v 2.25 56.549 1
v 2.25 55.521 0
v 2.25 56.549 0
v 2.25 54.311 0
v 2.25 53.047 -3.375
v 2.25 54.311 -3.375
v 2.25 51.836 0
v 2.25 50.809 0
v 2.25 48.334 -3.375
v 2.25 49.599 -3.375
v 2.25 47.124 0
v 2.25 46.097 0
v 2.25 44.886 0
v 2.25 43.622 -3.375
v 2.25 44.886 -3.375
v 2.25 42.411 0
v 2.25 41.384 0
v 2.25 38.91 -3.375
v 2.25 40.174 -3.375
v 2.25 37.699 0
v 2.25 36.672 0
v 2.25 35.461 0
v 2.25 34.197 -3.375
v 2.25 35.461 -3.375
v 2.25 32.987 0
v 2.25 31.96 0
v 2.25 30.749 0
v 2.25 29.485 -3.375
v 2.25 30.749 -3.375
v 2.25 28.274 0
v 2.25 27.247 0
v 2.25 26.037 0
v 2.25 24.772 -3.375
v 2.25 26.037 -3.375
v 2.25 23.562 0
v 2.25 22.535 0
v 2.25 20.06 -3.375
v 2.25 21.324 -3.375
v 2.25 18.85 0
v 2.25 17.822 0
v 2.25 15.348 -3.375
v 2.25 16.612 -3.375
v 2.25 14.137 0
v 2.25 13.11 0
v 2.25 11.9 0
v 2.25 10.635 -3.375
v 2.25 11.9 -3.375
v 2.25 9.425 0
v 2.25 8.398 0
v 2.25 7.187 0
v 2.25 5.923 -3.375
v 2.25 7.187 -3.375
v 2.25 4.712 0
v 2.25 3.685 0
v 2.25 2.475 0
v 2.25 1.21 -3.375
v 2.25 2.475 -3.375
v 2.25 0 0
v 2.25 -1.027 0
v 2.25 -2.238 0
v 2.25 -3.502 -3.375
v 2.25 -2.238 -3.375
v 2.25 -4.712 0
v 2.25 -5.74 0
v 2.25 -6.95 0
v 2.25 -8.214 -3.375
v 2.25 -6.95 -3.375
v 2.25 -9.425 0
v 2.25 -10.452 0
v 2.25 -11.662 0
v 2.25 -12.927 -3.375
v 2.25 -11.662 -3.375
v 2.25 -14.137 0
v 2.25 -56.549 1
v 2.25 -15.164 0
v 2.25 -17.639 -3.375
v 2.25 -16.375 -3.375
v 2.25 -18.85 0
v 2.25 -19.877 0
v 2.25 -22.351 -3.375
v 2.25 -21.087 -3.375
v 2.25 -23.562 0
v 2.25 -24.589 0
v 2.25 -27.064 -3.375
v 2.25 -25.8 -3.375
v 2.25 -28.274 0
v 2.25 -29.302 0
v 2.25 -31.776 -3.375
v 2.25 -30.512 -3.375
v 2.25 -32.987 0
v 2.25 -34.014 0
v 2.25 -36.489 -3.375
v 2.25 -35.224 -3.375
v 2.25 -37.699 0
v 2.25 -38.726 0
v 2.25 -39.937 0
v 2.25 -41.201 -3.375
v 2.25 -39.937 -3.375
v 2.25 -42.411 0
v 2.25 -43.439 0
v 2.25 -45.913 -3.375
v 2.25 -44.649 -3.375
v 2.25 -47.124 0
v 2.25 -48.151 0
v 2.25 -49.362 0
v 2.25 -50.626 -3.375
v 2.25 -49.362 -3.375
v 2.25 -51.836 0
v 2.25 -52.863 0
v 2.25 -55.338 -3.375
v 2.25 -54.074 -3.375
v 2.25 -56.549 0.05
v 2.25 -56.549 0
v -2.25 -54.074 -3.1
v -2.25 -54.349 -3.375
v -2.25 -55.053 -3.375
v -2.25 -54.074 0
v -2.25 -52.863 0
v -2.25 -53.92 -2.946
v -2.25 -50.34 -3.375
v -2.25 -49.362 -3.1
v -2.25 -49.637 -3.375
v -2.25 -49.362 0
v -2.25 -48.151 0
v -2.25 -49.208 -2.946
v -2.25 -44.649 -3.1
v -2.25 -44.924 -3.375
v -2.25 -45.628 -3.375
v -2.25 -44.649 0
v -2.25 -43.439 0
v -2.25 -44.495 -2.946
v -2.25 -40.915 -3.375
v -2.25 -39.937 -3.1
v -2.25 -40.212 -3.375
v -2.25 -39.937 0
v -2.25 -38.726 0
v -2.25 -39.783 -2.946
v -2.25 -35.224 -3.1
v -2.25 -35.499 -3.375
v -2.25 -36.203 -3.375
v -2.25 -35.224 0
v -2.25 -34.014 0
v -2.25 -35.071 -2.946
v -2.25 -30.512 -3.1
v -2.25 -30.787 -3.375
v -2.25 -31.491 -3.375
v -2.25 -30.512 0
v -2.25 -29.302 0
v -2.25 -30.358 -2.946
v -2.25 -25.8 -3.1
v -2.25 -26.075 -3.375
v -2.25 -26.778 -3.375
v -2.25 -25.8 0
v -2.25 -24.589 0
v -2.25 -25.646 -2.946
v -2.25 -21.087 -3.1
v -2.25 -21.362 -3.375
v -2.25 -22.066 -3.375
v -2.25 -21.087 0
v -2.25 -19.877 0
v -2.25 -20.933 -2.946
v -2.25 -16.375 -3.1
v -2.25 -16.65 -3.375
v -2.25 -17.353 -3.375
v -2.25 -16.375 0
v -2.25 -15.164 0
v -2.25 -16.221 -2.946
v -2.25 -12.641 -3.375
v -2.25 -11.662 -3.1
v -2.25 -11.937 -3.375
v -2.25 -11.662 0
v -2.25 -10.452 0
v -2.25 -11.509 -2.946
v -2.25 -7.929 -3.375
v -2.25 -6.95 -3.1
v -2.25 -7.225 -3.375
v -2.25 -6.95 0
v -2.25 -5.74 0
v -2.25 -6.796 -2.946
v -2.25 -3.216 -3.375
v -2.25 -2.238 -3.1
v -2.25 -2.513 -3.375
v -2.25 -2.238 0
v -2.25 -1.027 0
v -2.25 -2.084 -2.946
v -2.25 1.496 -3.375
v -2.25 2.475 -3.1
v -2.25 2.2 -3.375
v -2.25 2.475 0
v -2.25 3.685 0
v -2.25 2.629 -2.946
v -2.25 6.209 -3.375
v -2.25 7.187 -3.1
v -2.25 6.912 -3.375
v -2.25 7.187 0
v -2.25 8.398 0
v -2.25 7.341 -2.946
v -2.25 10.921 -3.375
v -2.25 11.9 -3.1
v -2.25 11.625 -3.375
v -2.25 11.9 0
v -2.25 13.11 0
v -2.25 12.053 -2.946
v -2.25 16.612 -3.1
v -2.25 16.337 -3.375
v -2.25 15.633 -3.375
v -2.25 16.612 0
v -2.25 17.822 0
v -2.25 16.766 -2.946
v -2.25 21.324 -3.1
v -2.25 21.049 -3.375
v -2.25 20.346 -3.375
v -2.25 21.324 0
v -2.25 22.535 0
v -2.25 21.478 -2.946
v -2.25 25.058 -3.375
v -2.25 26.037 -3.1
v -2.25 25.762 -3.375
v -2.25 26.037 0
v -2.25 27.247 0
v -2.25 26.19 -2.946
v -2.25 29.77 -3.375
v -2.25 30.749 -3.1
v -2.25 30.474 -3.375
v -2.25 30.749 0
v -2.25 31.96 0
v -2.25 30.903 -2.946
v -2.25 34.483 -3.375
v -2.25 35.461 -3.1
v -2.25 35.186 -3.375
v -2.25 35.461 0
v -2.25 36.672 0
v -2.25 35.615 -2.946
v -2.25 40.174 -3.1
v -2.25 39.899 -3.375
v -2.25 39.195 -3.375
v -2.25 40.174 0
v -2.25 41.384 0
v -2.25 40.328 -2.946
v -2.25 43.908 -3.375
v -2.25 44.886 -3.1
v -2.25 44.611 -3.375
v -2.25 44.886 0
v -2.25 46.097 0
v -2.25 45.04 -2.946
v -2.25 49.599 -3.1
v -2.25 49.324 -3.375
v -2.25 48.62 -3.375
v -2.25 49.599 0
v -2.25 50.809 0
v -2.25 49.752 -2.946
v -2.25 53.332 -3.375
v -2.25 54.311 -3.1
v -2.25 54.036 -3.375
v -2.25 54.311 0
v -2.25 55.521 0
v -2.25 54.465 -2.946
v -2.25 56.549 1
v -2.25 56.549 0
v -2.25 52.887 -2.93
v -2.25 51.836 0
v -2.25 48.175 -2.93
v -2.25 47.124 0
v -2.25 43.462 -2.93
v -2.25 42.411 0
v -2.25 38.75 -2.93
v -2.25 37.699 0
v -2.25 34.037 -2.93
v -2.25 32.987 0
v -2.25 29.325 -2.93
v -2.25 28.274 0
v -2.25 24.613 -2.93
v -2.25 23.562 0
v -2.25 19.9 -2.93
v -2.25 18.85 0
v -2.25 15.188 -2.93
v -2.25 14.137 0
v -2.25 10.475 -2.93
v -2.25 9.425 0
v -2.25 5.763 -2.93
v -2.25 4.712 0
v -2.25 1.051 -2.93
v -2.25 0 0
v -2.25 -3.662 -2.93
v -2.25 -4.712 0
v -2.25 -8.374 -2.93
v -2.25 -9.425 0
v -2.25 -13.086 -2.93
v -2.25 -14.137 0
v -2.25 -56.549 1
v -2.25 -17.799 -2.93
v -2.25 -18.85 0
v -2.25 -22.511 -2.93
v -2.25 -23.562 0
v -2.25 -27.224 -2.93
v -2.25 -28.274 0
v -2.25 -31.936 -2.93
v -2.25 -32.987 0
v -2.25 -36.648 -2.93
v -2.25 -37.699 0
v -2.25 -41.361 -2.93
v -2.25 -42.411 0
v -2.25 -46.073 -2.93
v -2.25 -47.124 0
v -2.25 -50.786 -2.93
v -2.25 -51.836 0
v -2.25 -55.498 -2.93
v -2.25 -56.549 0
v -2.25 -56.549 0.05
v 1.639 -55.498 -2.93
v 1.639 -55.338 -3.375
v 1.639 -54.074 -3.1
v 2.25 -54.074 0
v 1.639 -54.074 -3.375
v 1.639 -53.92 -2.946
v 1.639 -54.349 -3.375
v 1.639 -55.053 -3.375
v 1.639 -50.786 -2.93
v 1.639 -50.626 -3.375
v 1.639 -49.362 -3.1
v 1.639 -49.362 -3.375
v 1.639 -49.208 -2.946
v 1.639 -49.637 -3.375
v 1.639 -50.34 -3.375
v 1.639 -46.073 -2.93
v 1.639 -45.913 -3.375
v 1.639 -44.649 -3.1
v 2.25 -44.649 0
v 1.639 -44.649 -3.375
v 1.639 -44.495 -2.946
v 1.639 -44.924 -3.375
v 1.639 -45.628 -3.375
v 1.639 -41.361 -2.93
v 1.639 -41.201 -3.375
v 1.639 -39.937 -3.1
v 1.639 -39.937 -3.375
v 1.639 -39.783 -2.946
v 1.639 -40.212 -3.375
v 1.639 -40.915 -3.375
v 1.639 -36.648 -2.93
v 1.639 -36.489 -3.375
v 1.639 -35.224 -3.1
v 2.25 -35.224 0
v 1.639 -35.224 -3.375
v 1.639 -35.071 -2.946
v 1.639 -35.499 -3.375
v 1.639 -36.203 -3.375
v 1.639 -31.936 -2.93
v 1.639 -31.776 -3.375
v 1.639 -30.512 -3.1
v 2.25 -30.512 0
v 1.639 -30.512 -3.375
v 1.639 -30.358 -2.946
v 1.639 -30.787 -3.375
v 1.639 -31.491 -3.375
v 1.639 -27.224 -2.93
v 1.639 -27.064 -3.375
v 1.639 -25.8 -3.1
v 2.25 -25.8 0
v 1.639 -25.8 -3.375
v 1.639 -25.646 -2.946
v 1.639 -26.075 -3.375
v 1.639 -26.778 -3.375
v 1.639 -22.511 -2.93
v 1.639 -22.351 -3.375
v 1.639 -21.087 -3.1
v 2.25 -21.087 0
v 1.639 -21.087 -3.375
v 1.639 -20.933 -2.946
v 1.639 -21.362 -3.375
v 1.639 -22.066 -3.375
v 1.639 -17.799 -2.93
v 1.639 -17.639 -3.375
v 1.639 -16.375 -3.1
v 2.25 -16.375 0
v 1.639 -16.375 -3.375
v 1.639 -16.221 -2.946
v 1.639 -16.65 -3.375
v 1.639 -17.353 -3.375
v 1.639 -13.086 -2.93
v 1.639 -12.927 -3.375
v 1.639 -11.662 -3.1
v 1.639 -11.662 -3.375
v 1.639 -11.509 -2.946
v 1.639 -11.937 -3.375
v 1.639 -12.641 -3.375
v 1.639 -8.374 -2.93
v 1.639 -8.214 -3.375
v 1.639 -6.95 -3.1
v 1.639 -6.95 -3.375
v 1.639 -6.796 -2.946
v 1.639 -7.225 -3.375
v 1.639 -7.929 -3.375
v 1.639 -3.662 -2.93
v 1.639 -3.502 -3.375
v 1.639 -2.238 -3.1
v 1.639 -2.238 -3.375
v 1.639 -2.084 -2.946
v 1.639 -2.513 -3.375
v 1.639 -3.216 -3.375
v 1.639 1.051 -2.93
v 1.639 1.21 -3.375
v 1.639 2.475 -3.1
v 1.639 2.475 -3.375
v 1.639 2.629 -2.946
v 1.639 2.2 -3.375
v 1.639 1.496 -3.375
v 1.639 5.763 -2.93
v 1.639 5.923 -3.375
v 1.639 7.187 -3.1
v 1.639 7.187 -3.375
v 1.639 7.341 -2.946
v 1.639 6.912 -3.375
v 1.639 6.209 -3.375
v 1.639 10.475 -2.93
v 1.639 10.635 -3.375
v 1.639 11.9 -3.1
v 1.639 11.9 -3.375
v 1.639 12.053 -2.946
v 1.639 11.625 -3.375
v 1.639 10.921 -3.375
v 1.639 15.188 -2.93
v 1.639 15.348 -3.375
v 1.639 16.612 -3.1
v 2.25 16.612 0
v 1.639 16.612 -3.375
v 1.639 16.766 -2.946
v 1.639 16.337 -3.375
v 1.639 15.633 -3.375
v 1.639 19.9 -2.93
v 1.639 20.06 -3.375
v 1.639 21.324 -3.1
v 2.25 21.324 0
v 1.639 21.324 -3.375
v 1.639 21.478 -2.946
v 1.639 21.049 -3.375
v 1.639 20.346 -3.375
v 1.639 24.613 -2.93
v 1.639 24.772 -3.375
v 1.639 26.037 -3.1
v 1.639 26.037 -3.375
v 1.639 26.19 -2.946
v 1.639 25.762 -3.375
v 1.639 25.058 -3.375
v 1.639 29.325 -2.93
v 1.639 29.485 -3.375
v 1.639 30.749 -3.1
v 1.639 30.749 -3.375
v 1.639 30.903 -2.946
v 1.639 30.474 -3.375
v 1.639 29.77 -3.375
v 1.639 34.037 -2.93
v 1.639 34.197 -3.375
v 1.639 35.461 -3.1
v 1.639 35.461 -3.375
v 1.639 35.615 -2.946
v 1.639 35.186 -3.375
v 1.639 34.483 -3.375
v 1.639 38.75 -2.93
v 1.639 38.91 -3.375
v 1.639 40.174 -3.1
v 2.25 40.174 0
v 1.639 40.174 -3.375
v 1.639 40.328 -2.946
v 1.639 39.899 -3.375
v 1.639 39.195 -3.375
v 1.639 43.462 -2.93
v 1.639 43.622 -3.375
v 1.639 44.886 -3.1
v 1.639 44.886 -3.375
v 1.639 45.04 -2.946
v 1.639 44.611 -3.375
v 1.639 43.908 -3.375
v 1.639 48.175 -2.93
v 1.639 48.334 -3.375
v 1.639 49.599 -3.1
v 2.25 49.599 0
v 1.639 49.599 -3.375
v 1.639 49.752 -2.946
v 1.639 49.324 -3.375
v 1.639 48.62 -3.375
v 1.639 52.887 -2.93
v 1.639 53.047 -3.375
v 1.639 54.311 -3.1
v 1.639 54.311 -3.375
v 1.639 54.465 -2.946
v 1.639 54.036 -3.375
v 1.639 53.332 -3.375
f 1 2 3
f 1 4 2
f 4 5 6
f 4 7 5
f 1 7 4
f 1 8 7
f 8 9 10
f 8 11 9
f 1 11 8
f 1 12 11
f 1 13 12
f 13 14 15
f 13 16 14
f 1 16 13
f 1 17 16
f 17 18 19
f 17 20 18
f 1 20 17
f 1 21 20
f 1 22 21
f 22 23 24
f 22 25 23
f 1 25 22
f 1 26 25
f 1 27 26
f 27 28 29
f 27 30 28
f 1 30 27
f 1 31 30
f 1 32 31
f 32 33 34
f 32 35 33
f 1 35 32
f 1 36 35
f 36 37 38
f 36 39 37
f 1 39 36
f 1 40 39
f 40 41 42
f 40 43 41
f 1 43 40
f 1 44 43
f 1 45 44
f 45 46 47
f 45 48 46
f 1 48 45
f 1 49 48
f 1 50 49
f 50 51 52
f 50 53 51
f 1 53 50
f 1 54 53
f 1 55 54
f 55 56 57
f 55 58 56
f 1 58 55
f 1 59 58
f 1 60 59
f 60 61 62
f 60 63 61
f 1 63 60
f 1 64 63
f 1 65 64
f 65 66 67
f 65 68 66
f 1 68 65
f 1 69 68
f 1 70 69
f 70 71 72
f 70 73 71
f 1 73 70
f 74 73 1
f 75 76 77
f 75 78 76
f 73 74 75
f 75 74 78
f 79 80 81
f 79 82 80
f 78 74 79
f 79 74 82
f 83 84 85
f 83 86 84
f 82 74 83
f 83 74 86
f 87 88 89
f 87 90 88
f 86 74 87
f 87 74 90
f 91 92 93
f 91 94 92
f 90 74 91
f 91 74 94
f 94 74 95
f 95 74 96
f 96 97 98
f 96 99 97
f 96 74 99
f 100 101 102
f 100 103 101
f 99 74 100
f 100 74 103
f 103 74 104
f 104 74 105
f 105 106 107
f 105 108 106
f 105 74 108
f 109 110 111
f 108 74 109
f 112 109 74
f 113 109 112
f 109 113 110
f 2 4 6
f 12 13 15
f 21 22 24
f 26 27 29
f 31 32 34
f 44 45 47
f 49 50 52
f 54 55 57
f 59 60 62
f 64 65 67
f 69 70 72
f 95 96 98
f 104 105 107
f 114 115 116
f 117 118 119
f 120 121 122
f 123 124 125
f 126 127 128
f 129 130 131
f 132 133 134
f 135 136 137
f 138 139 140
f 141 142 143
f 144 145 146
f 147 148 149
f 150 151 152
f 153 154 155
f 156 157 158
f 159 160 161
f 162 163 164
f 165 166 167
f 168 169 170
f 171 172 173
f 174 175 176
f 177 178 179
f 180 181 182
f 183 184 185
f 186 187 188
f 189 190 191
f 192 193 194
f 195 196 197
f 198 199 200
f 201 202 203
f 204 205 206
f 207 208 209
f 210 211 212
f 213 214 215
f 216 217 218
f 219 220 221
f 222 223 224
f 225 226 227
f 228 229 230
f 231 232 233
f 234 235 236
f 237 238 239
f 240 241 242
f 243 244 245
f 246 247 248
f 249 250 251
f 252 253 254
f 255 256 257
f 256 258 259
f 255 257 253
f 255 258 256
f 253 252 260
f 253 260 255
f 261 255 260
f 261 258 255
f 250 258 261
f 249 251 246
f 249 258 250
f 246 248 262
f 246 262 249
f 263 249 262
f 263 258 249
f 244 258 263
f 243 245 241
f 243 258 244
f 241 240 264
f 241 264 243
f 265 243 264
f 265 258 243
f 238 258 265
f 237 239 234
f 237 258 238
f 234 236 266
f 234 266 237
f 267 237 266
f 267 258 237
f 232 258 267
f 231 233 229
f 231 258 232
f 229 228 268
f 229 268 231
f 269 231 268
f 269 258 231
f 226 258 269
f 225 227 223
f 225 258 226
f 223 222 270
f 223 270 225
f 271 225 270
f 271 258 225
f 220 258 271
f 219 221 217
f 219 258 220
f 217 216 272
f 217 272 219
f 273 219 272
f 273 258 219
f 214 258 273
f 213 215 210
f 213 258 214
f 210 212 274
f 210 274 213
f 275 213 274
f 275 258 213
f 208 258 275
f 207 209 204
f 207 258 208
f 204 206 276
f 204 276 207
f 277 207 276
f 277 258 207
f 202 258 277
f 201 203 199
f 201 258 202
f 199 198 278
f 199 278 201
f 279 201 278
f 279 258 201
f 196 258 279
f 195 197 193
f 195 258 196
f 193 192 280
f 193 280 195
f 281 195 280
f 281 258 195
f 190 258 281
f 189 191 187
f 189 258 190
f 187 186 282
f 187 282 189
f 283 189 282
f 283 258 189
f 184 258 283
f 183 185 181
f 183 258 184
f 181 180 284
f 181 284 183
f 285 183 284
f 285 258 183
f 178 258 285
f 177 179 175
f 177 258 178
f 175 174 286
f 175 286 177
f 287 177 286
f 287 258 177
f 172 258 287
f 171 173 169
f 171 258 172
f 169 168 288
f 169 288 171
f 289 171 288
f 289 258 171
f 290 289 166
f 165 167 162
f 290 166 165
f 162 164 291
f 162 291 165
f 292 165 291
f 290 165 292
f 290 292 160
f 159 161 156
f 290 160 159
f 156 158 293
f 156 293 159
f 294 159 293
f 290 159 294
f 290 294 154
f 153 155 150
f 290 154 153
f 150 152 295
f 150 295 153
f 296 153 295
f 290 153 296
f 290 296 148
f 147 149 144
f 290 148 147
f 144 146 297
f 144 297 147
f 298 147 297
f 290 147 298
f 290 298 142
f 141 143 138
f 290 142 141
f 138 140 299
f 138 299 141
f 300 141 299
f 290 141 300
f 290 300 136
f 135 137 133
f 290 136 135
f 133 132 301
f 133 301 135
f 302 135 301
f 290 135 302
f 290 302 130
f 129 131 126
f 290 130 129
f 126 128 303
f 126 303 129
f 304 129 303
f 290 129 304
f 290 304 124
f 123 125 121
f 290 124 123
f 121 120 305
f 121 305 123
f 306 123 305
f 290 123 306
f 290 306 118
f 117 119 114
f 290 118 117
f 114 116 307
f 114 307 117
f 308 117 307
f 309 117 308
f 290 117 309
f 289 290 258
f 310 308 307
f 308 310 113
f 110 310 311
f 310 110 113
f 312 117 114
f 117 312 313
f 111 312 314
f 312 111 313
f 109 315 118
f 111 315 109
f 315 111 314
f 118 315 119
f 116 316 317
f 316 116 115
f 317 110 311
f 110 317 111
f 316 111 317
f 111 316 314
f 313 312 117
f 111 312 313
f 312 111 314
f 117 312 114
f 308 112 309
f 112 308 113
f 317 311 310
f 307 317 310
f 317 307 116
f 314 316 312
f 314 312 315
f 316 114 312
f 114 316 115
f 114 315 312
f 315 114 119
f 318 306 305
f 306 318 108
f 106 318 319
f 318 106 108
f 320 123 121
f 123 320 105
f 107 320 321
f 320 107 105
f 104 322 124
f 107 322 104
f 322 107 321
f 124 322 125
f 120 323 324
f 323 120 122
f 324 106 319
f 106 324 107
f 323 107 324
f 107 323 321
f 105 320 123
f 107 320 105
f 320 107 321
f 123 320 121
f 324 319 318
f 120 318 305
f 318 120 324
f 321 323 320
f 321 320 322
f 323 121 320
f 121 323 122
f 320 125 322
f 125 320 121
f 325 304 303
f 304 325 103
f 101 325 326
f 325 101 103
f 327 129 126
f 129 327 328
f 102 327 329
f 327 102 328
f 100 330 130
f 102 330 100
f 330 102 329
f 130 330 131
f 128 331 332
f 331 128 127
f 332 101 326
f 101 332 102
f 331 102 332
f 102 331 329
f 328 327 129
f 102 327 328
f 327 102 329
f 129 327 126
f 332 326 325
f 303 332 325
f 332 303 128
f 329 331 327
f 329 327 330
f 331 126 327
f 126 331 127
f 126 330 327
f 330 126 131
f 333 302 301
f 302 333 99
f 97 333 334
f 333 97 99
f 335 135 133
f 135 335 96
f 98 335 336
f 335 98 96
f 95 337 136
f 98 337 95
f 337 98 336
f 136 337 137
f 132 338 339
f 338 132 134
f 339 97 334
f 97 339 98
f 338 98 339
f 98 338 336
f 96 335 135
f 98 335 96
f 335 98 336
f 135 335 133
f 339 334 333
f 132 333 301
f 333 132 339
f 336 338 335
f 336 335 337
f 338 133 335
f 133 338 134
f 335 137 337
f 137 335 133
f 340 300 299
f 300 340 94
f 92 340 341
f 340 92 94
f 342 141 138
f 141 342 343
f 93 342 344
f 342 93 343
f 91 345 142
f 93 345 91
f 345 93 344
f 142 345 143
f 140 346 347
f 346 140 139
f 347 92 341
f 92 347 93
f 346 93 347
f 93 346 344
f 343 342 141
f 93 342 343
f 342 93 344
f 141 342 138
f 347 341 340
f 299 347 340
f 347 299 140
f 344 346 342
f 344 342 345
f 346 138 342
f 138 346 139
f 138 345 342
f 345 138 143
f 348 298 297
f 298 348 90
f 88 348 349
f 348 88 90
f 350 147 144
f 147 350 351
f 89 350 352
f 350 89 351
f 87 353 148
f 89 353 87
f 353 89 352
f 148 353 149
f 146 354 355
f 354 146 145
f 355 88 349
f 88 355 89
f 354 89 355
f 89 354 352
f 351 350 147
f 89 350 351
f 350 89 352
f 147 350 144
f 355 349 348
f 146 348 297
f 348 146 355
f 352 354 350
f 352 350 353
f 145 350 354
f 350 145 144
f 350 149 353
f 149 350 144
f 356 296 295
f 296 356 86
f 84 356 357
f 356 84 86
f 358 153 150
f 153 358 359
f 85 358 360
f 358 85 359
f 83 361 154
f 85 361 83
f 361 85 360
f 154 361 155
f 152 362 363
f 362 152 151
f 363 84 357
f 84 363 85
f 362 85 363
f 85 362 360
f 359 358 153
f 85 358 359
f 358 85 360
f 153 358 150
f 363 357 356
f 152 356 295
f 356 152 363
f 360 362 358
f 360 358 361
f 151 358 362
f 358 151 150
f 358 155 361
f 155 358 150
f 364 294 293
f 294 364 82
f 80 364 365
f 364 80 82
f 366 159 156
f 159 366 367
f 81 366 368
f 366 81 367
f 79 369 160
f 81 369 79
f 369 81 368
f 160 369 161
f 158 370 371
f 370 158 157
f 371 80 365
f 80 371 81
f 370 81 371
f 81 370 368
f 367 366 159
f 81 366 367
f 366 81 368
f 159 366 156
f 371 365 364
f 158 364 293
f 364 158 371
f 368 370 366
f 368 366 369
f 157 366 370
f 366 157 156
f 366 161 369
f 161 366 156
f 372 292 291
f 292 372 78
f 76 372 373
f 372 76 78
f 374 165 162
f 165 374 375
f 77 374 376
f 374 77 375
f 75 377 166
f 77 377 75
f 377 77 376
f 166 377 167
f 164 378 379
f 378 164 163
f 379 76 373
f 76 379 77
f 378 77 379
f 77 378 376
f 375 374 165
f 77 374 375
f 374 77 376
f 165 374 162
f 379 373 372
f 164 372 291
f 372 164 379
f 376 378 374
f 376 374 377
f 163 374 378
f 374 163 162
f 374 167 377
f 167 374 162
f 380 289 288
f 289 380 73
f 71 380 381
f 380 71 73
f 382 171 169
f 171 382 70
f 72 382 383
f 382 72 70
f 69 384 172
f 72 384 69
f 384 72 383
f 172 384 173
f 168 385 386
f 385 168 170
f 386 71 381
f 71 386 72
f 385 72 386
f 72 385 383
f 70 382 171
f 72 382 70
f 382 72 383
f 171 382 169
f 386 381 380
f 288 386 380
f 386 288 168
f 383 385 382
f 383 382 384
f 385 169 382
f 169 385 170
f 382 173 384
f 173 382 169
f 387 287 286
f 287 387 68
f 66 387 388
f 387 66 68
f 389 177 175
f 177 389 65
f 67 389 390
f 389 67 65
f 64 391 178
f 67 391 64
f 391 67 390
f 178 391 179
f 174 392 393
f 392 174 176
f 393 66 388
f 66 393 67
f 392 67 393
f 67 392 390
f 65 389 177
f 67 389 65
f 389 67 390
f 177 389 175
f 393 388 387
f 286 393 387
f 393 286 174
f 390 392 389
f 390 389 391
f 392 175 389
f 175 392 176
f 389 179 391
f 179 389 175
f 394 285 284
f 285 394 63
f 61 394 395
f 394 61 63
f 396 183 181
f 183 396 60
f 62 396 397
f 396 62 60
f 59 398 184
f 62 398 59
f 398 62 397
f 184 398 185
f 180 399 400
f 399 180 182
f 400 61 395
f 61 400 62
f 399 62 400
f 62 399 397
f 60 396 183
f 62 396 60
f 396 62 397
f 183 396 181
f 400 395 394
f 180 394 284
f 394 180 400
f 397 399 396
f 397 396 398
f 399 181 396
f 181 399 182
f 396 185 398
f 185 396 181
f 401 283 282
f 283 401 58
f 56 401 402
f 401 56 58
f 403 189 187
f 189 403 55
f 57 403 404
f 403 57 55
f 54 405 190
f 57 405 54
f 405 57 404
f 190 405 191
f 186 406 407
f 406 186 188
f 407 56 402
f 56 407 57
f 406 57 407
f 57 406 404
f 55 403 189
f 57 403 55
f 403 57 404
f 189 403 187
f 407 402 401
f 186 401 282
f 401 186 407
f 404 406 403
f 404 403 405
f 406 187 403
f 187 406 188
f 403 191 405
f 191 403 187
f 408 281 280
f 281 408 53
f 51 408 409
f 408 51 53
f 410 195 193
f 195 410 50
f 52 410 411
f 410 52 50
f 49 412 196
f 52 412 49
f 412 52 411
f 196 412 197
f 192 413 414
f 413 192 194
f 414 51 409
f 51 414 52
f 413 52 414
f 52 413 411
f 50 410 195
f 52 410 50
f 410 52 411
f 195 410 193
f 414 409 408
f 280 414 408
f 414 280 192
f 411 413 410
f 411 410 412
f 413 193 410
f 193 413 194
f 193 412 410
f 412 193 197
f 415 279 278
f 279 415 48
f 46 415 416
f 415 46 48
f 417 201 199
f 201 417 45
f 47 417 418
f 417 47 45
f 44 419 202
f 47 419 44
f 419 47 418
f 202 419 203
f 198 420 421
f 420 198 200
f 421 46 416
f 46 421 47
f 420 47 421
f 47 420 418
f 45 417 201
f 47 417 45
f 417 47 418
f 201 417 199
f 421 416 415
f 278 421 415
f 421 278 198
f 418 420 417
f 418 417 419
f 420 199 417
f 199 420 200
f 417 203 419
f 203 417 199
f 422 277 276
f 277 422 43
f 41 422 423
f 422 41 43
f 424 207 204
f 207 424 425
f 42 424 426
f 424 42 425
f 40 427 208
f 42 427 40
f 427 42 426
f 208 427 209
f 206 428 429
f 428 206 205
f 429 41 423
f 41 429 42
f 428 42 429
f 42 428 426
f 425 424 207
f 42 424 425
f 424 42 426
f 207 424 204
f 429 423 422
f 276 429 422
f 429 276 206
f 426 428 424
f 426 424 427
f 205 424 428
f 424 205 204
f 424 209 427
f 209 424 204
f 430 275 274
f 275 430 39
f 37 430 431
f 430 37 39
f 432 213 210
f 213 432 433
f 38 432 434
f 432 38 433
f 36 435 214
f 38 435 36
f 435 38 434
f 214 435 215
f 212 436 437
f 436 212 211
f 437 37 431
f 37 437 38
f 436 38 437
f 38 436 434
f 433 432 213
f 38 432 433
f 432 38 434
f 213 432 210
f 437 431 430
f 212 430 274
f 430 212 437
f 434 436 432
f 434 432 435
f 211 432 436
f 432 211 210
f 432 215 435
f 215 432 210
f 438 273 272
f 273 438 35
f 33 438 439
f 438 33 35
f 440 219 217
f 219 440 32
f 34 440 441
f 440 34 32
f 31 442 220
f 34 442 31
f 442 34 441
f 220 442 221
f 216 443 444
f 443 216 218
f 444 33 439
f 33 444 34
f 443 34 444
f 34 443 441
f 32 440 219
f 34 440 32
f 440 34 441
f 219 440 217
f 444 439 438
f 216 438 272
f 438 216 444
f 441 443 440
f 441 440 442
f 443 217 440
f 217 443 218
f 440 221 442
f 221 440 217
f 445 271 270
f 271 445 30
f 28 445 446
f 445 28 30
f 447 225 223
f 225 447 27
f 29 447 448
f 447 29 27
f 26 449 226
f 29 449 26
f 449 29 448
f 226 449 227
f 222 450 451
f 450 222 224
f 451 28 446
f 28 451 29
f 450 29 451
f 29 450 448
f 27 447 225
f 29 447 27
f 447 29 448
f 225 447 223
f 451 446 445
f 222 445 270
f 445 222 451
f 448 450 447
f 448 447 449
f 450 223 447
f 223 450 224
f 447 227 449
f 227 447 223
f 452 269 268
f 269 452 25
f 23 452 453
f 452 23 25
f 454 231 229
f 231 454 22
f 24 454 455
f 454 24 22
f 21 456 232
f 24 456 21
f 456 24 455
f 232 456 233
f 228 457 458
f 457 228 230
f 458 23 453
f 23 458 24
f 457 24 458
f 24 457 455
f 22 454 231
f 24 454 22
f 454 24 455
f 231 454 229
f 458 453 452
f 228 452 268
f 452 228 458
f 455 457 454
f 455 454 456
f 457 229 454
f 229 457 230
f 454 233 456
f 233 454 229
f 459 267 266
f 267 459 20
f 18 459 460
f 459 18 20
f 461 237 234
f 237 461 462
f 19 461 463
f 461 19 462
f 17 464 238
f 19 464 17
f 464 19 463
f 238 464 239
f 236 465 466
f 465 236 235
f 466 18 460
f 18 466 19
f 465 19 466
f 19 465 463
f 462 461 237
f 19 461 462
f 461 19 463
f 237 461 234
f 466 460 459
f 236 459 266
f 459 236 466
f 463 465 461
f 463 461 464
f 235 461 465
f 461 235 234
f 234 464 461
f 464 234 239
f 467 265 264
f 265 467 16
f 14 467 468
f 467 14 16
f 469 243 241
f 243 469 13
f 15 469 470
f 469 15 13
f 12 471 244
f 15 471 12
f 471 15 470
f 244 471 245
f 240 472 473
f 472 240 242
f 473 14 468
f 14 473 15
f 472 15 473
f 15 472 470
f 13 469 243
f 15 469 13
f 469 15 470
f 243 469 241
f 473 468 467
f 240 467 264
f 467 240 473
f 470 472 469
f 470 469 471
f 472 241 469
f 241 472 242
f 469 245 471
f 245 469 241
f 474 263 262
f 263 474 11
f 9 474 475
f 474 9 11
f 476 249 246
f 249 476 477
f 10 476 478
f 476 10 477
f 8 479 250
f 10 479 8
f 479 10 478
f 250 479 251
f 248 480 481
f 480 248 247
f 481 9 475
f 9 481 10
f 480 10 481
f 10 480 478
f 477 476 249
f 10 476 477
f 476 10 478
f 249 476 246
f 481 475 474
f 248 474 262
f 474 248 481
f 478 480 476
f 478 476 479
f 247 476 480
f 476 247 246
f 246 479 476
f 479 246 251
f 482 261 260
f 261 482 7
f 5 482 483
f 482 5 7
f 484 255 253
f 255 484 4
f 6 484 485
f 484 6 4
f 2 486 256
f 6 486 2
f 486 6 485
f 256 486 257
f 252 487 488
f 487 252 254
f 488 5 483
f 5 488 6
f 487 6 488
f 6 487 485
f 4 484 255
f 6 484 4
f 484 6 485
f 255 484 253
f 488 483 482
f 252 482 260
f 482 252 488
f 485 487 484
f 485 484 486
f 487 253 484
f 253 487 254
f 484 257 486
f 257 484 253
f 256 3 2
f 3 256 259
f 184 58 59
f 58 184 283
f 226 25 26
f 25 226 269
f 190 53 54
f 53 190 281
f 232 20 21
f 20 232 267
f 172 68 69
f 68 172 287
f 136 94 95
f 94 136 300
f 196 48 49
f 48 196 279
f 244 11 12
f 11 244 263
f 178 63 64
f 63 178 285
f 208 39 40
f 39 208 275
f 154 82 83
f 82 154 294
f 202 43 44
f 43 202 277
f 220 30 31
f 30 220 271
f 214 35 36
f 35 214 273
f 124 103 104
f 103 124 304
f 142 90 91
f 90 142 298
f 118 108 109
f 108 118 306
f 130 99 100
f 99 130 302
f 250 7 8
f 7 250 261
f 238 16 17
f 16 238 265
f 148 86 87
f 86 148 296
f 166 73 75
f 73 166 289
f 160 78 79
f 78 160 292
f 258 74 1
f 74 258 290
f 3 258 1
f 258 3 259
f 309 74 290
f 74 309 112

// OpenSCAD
/*
 * CHANGE LOG
 *
 * 2011-09-18: Cleanup unused code + echo length of gear rack + center object + appropriate rotation for printing + added bevel to top of teeth
 * 2011-09-17: Initial version uploaded (http://www.thingiverse.com/thing:11642)
 */

pi = 3.1415926535897932384626433832795;
debug = false;

module tooth(mod,width) {
	// see http://easycalculation.com/trigonometry/triangle-angles.php
	opposite_at_reference_pitch=mod / tan(70);
	if (debug) echo("Opposite at reference pitch: ", opposite_at_reference_pitch);
	// see http://www.metrication.com/engineering/gears.html
	// see section Circular Tooth Thickness
	// see also http://www.tech.plym.ac.uk/sme/desnotes/gears/nomen1.htm
	tooth_width_at_reference_pitch=(pi / 2) * mod;
	if (debug) echo("Tooth width at reference_pitch: ", tooth_width_at_reference_pitch);
	cube_width = tooth_width_at_reference_pitch - (2 * opposite_at_reference_pitch);
	if (debug) echo("Cube width: ", cube_width);
	// see http://www.metrication.com/engineering/gears.html
	// see section Whole Depth
	opposite_of_triangle = mod < 1.25 ? 2.4 * mod : 2.25 * mod;
	if (debug) echo("Opposite_of_triangle: ", opposite_of_triangle);
	// see http://easycalculation.com/trigonometry/triangle-angles.php
	adjacent_of_triangle = opposite_of_triangle / tan(70);
	if (debug) echo("Adjacent of triangle: ", adjacent_of_triangle);
	diagonal = sqrt((opposite_of_triangle + 0.05) * (opposite_of_triangle + 0.05) + (adjacent_of_triangle * adjacent_of_triangle));
	correct_angle = 90 - acos(adjacent_of_triangle / diagonal);
	if (debug) echo("Correct angle: ", correct_angle);
	adjacent_of_mini_triangle = 0.05 / tan(90 - correct_angle);
	if (debug) echo("Adjacent of mini triangle: ", adjacent_of_mini_triangle);
	adjacent_top_cube = (0.5 * mod) / tan(45);
	translate([0,adjacent_of_mini_triangle * -1, 0]) {
		difference() {
			union() {
				intersection() {
					cube([opposite_of_triangle + 0.05,adjacent_of_triangle, width]);
					rotate([0,0,correct_angle]) cube([diagonal,adjacent_of_triangle, width]);
				}
				translate([0,adjacent_of_triangle,0]) cube([opposite_of_triangle + 0.05,cube_width, width]);
				translate([0,(adjacent_of_triangle * 2) + cube_width,width]) {
					rotate([180,0,0]) {
						intersection() {
							cube([opposite_of_triangle + 0.05,adjacent_of_triangle, width]);
							rotate([0,0,correct_angle]) cube([diagonal,adjacent_of_triangle, width]);
						}
					}
				}
			}
			translate([-0.5 * mod,-1,-0.5 * mod])cube([1 * mod + 0.05, 1+ adjacent_of_mini_triangle, width + (1 * mod)]);
			translate([-0.5 * mod,(adjacent_of_triangle * 2) + cube_width - adjacent_of_mini_triangle,-0.5 * mod]) cube([1 * mod + 0.05, 1, width + (1 * mod)]);
			translate([opposite_of_triangle + 0.05 * mod,adjacent_of_triangle - adjacent_top_cube,-0.25 * mod]) {
				rotate([0,0,45]) cube([1 * mod, 0.5 * mod,cube_width + (2 * mod)]);
			}
			translate([opposite_of_triangle + 0.05 * mod,adjacent_of_triangle - adjacent_top_cube + cube_width + 0.3 * mod,-0.25 * mod]) {
				rotate([0,0,45]) cube([0.5 * mod, 1 * mod,cube_width + (2 * mod)]);
			}
		}
	}
}

module teeth(mod,number_of_teeth,width) {
	union() {
		for (i= [0:number_of_teeth - 1]) {
			// see http://www.tech.plym.ac.uk/sme/desnotes/gears/nomen1.htm
			translate([-0.05,i * mod * pi,0]) {
				tooth(mod=mod,width=width);	
			}
		}
	}
}

module gear_rack(mod,number_of_teeth,rack_width,rack_bottom_height) {
	total_rack_length = number_of_teeth * pi * mod;
	rotate([0,90,0]) {
		translate([0,total_rack_length / 2 * -1,rack_width / 2 * -1]) {
			union() {
				teeth(mod=mod,number_of_teeth=number_of_teeth,width=rack_width);
				translate([rack_bottom_height * -1,0,0])
					cube([rack_bottom_height, number_of_teeth * pi * mod, rack_width]);
			}
		}
	}
	echo("Total length of gear rack (in mm): ", total_rack_length);
}

gear_rack(mod=1.5,number_of_teeth=24,rack_width=4.5,rack_bottom_height=1);

//tooth(mod=1.25,width=2);
